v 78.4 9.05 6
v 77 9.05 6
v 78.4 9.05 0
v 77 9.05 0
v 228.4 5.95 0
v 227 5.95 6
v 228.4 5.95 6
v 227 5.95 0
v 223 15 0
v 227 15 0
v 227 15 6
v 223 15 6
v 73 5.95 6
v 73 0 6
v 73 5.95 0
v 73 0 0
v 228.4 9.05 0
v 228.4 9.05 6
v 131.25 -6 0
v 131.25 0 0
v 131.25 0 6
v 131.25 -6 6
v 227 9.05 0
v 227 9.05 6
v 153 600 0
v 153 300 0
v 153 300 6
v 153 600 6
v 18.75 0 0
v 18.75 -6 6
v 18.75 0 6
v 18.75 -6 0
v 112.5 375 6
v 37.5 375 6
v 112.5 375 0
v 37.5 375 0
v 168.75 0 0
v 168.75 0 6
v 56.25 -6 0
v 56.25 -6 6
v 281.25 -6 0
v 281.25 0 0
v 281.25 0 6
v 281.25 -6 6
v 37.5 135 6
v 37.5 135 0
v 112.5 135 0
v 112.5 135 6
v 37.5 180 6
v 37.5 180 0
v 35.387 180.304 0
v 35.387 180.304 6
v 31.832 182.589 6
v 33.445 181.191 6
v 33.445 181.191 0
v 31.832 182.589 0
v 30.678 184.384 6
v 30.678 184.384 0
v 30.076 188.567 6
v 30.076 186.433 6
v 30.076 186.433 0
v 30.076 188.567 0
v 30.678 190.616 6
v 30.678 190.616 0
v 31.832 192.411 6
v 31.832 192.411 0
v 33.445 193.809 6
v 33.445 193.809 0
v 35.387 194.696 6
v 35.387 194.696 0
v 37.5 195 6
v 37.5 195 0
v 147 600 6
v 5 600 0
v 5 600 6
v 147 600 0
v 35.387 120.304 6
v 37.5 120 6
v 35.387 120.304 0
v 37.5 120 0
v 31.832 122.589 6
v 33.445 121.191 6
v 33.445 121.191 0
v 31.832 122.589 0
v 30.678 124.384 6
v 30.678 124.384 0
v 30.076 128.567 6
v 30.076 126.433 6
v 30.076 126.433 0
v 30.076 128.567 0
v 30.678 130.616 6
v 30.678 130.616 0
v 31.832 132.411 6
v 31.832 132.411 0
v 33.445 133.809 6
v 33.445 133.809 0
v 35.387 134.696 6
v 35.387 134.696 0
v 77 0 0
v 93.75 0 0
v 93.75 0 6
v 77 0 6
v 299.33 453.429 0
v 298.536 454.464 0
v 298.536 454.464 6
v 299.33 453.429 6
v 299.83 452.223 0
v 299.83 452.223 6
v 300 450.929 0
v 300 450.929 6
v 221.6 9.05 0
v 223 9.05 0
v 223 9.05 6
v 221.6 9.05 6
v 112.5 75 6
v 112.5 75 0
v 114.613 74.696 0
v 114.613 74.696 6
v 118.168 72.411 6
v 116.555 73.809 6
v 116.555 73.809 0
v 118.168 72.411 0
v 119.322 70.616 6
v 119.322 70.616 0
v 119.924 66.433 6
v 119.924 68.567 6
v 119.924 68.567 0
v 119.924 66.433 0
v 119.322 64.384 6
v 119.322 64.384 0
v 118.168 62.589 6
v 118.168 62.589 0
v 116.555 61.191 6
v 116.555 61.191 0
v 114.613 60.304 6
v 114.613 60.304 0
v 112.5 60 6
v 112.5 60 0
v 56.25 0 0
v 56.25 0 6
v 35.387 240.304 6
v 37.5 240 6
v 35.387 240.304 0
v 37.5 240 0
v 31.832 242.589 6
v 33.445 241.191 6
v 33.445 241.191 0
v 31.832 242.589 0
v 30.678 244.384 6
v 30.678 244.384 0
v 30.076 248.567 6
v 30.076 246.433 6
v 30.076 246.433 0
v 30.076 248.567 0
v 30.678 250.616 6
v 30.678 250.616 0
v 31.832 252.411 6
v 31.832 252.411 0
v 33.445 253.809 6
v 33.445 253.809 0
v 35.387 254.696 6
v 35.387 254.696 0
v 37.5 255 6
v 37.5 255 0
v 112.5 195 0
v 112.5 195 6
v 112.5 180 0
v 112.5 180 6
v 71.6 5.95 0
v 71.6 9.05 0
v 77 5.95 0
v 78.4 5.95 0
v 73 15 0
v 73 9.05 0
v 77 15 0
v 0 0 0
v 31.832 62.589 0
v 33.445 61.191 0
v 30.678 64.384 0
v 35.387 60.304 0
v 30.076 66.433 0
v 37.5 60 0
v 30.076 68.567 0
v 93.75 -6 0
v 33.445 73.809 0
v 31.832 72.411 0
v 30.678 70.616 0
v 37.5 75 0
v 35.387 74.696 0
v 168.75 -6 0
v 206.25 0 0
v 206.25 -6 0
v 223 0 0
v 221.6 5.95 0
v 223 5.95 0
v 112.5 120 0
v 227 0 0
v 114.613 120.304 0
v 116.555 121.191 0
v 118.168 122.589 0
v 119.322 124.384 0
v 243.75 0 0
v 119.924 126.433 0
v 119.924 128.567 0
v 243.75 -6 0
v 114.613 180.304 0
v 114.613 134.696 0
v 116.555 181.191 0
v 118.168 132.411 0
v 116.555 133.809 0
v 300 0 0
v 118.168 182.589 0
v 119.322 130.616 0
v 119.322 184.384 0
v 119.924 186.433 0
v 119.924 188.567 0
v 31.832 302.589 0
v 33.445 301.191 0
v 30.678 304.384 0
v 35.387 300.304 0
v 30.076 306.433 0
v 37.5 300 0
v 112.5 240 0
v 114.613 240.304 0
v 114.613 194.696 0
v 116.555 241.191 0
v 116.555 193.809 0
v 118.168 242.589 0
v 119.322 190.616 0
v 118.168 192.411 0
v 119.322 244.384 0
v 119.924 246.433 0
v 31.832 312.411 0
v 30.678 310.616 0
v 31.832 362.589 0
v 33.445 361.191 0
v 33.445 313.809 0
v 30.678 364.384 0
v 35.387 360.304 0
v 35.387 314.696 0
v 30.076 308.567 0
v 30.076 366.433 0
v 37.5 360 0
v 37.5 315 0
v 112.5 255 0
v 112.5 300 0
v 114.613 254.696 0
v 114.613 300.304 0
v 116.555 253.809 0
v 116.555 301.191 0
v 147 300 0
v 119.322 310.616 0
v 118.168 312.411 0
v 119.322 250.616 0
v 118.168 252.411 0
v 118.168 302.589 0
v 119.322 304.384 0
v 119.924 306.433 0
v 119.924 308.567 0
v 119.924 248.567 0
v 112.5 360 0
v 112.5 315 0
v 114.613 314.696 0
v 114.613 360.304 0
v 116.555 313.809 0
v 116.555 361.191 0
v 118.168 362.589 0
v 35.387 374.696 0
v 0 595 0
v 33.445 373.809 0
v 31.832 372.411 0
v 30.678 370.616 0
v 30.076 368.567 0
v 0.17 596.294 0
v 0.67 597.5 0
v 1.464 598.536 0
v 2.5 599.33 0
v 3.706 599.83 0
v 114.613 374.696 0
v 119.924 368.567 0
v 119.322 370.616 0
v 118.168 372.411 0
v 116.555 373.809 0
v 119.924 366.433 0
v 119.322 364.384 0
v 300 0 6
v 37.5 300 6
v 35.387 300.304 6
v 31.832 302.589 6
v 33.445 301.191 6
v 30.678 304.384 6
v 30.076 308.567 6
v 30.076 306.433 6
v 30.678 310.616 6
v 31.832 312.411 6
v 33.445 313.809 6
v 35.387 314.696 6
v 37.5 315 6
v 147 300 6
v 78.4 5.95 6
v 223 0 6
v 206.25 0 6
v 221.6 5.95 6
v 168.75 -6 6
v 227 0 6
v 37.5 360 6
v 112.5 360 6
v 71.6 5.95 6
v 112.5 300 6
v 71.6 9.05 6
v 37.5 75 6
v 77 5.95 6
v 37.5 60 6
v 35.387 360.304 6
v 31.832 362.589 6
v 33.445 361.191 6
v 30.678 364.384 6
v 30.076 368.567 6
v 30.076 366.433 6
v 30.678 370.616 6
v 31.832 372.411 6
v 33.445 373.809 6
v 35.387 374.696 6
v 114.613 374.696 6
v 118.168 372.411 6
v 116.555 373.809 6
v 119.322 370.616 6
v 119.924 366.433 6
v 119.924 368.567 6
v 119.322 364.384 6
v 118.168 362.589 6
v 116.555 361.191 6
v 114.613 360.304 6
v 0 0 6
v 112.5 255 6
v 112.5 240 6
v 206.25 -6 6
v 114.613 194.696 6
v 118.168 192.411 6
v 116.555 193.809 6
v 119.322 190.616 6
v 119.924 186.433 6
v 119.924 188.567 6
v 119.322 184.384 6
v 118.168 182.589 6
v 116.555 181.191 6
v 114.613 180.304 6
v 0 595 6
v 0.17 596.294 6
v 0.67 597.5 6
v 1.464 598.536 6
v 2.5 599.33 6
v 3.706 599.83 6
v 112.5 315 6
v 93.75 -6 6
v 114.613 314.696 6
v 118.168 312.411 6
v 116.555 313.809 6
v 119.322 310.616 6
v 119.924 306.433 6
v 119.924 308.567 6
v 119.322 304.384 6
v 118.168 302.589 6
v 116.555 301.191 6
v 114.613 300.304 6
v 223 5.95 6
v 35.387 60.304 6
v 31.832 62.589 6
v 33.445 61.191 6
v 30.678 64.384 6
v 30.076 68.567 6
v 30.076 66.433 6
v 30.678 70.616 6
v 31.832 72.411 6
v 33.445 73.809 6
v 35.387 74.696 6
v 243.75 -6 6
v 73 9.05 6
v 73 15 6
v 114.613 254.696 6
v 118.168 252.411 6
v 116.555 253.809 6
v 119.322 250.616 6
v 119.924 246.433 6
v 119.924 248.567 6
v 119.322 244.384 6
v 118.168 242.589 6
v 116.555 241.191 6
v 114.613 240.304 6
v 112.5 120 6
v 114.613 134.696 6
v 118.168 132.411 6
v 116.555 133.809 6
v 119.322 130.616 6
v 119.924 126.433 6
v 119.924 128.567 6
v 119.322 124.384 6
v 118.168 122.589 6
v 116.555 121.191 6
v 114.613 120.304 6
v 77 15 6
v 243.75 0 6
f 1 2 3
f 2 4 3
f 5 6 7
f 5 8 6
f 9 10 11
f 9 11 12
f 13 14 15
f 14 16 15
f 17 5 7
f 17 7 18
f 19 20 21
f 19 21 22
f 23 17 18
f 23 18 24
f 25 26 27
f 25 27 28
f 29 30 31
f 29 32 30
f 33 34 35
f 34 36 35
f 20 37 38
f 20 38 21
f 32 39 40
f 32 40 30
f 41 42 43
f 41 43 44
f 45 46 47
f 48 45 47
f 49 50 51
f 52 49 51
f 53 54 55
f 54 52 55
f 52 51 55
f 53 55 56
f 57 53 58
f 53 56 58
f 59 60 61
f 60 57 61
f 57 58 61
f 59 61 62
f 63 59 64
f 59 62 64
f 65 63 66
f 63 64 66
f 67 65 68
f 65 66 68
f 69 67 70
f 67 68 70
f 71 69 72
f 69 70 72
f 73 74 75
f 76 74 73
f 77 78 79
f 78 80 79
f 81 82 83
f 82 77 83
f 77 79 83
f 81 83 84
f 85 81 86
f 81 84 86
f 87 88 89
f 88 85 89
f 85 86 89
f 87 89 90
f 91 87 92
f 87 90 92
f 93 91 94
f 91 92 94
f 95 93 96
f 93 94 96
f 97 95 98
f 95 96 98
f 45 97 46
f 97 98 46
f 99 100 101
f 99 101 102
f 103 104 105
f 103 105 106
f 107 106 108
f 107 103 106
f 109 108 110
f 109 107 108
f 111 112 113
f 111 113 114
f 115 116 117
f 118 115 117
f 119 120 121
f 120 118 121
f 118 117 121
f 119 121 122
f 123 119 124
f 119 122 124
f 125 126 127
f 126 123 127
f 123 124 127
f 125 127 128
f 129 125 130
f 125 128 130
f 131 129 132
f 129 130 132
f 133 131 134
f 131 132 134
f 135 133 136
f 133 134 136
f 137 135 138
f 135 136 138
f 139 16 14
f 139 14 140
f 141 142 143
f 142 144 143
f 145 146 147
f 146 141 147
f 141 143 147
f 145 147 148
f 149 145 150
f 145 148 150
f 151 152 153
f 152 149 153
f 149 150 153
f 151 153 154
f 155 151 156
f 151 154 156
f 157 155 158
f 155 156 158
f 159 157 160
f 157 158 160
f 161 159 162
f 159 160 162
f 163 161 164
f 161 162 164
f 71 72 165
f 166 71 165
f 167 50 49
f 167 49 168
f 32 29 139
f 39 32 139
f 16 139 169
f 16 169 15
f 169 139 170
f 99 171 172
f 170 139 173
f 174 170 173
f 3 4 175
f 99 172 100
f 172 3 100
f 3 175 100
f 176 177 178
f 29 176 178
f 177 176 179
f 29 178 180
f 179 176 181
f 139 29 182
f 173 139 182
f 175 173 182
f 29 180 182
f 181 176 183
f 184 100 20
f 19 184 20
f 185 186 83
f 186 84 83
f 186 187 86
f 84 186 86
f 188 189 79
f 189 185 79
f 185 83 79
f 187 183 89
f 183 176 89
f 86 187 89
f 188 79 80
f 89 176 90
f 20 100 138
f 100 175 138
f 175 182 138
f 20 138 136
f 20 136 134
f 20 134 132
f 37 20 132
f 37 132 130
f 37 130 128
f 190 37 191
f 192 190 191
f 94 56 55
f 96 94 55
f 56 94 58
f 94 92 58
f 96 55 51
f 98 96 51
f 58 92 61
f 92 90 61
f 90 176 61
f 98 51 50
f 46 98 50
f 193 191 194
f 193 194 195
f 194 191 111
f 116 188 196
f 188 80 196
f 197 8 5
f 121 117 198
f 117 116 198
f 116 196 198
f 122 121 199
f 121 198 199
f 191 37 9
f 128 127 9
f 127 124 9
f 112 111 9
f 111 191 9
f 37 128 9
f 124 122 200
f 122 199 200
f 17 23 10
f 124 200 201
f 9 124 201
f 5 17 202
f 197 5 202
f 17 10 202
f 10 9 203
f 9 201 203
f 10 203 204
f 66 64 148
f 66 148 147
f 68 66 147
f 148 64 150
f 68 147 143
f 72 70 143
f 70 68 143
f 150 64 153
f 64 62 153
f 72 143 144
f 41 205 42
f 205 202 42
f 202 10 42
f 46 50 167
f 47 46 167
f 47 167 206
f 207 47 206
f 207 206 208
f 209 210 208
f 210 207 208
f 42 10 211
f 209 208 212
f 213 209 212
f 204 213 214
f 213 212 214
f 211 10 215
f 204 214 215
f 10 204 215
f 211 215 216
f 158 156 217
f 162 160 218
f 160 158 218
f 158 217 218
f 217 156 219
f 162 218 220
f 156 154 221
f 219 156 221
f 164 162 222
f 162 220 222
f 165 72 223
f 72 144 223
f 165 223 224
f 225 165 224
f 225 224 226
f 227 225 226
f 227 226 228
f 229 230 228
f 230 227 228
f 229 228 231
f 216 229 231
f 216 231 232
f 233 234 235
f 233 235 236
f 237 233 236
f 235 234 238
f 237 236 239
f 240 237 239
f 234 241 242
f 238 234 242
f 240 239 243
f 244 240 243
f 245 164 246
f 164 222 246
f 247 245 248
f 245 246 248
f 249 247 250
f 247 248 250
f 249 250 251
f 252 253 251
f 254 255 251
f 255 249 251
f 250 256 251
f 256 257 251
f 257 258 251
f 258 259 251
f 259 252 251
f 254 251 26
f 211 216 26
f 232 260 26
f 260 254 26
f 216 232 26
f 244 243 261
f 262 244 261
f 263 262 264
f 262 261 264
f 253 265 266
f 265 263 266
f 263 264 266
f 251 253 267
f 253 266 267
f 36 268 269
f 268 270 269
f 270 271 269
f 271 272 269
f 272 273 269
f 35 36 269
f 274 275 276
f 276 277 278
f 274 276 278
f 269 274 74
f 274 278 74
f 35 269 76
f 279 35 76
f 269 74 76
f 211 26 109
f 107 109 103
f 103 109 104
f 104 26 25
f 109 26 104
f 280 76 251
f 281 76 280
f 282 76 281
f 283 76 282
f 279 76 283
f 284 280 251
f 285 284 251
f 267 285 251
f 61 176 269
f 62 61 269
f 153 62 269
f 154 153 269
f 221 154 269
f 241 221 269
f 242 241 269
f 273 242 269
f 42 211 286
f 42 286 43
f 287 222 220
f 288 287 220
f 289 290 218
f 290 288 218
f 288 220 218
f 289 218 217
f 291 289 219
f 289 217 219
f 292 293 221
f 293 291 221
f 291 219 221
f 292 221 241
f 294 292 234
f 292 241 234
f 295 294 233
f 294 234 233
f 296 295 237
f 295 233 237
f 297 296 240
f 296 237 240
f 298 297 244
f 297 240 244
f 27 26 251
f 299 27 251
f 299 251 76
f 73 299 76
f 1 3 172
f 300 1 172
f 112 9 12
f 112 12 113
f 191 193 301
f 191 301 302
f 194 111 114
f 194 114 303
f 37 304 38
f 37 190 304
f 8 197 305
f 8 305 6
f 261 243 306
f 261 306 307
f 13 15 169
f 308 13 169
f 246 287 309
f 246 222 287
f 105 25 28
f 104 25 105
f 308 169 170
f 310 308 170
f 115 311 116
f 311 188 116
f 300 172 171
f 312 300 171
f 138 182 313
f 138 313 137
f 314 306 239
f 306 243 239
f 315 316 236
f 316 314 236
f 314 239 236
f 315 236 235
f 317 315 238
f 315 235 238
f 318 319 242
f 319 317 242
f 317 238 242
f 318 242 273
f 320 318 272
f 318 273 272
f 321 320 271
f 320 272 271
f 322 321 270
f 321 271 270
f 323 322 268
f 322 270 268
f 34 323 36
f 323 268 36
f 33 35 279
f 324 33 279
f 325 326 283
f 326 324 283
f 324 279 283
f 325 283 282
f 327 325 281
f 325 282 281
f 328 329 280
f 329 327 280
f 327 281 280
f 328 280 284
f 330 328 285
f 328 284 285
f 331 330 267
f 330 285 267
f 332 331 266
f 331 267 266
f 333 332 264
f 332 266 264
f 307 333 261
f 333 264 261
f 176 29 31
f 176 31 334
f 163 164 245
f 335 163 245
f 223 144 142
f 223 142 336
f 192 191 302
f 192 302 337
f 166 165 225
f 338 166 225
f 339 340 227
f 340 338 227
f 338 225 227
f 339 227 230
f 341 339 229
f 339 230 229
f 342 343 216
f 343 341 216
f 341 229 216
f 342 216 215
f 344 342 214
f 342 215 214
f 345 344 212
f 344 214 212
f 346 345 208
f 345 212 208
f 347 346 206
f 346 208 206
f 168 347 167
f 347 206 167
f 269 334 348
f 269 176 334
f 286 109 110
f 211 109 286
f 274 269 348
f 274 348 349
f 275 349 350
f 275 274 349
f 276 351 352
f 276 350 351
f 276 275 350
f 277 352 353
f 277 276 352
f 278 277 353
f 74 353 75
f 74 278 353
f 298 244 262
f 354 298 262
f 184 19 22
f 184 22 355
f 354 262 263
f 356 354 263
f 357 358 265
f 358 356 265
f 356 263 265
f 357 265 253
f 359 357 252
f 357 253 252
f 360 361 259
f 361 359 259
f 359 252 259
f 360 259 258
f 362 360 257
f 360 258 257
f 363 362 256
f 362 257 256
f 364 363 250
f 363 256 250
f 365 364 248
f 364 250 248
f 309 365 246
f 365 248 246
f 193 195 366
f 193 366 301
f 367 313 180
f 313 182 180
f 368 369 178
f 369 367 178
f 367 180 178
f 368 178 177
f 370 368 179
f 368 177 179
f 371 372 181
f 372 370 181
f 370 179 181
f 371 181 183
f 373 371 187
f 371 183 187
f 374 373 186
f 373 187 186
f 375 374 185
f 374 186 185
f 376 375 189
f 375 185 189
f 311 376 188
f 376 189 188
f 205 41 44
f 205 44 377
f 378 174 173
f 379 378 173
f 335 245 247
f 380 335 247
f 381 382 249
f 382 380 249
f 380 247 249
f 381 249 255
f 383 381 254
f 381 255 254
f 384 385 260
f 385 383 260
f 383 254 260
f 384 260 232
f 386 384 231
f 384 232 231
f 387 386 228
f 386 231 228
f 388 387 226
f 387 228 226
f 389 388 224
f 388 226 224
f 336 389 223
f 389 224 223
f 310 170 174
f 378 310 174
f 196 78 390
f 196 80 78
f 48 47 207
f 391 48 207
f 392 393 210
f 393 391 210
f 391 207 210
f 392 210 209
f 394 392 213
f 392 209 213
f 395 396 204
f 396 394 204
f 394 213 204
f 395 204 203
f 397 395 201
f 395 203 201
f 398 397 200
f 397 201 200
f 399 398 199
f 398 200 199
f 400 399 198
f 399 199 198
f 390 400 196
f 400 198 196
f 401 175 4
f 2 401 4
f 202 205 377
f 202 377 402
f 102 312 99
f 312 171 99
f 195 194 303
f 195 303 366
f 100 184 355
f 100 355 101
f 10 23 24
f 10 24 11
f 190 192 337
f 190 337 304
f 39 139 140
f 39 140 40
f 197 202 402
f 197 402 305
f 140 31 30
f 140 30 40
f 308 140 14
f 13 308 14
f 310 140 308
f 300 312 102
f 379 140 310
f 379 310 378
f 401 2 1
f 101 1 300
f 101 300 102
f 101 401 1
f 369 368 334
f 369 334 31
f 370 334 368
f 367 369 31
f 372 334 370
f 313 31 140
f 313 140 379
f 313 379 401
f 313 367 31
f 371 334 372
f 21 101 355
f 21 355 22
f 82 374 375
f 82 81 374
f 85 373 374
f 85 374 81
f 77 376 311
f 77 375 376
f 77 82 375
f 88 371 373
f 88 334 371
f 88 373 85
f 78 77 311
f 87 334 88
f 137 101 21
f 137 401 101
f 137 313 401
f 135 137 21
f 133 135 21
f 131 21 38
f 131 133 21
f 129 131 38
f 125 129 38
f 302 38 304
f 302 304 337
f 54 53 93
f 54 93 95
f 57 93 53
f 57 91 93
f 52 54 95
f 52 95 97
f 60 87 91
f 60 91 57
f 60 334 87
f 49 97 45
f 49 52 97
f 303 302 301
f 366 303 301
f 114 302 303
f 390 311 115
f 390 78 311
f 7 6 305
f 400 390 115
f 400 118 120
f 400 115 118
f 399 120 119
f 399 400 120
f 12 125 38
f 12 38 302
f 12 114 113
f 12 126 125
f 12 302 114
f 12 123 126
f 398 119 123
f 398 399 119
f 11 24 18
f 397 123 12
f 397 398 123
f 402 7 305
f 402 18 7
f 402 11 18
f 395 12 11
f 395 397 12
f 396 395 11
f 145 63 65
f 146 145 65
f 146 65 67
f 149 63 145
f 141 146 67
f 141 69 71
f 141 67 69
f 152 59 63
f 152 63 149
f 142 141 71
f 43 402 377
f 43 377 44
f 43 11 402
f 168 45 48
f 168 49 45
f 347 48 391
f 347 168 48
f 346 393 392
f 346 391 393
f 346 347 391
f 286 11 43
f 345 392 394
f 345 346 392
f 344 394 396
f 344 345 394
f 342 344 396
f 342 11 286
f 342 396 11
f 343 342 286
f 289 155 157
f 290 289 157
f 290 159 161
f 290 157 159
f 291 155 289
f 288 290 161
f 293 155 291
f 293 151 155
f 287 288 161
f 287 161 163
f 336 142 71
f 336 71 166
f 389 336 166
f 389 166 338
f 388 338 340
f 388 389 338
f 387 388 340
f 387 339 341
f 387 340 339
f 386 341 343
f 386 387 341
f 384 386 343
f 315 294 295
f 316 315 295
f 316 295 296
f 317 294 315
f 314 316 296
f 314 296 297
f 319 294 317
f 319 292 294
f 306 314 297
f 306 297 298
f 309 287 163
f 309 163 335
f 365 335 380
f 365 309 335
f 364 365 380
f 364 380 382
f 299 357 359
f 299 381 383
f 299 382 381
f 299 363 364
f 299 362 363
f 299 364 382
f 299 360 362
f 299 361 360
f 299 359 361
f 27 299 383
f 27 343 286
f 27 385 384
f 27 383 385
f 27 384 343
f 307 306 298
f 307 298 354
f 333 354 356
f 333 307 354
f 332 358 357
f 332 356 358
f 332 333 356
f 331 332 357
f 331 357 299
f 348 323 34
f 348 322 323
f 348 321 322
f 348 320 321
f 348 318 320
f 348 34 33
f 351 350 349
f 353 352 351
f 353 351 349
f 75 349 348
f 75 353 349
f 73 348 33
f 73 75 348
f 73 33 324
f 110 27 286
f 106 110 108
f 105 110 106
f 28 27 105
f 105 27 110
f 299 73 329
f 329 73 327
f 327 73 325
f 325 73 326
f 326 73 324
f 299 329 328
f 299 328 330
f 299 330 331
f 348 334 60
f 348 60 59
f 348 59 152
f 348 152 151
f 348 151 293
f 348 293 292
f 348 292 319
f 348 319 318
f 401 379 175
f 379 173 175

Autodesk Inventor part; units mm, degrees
ref_plane "YZ Plane" through (0, 0, 0) normal (1, 0, 0) x (0, 1, 0)
ref_plane "XZ Plane" through (0, 0, 0) normal (0, 1, 0) x (-1, 0, 0)
ref_plane "XY Plane" through (0, 0, 0) normal (0, 0, 1) x (1, 0, 0)
sketch "Эскиз1" plane through (0, 0, 0) normal (0, 0, 1) x (1, 0, 0)
  line L0 (0, 0) -> (0, 595)
  line L1 (5, 600) -> (147, 600)
  line L2 (153, 600) -> (298.5355, 454.4645)
  line L3 (300, 450.9289) -> (300, 0)
  line L4 (300, 0) -> (281.25, 0)
  line L5 (281.25, 0) -> (281.25, -6)
  line L6 (281.25, -6) -> (243.75, -6)
  line L7 (243.75, -6) -> (243.75, 0)
  line L8 (243.75, 0) -> (206.25, 0)
  line L9 (206.25, 0) -> (206.25, -6)
  line L10 (206.25, -6) -> (168.75, -6)
  line L11 (168.75, -6) -> (168.75, 0)
  line L12 (168.75, 0) -> (131.25, 0)
  line L13 (131.25, 0) -> (131.25, -6)
  line L14 (131.25, -6) -> (93.75, -6)
  line L15 (93.75, -6) -> (93.75, 0)
  line L16 (93.75, 0) -> (56.25, 0)
  line L17 (56.25, 0) -> (56.25, -6)
  line L18 (56.25, -6) -> (18.75, -6)
  line L19 (18.75, -6) -> (18.75, 0)
  line L20 (18.75, 0) -> (0, 0)
  line L21 (18.75, 0) -> (-18.75, 0) construction
  line L22 (281.25, 0) -> (318.75, 0) construction
  line L23 (153, 600) -> (147, 600) construction
  line L24 (150, 600) -> (150, 0) construction
  line L25 (0, 300) -> (150, 300) construction
  line L26 (150, 300) -> (300, 300) construction
  arc A0 (37.5, 375) -> (37.5, 360) centre (37.5, 367.5) ccw
  line L27 (37.5, 360) -> (112.5, 360)
  line L28 (37.5, 375) -> (112.5, 375)
  line L29 (75, 375) -> (75, 360) construction
  arc A1 (112.5, 360) -> (112.5, 375) centre (112.5, 367.5) ccw
  line L30 (37.5, 367.5) -> (0, 367.5) construction
  line L31 (112.5, 367.5) -> (150, 367.5) construction
  line L32 (37.5, 300) -> (112.5, 300)
  arc A2 (112.5, 300) -> (112.5, 315) centre (112.5, 307.5) ccw
  line L33 (37.5, 315) -> (112.5, 315)
  arc A3 (37.5, 315) -> (37.5, 300) centre (37.5, 307.5) ccw
  line L34 (37.5, 240) -> (112.5, 240)
  arc A4 (112.5, 240) -> (112.5, 255) centre (112.5, 247.5) ccw
  line L35 (37.5, 255) -> (112.5, 255)
  arc A5 (37.5, 255) -> (37.5, 240) centre (37.5, 247.5) ccw
  line L36 (37.5, 180) -> (112.5, 180)
  arc A6 (112.5, 180) -> (112.5, 195) centre (112.5, 187.5) ccw
  line L37 (37.5, 195) -> (112.5, 195)
  arc A7 (37.5, 195) -> (37.5, 180) centre (37.5, 187.5) ccw
  line L38 (37.5, 120) -> (112.5, 120)
  arc A8 (112.5, 120) -> (112.5, 135) centre (112.5, 127.5) ccw
  line L39 (37.5, 135) -> (112.5, 135)
  arc A9 (37.5, 135) -> (37.5, 120) centre (37.5, 127.5) ccw
  line L40 (37.5, 60) -> (112.5, 60)
  arc A10 (112.5, 60) -> (112.5, 75) centre (112.5, 67.5) ccw
  line L41 (37.5, 75) -> (112.5, 75)
  arc A11 (37.5, 75) -> (37.5, 60) centre (37.5, 67.5) ccw
  line L42 (153, 300) -> (147, 300)
  line L43 (153, 300) -> (153, 600)
  line L44 (147, 300) -> (147, 600)
  arc A12 (300, 450.9289) -> (298.5355, 454.4645) centre (295, 450.9289) ccw
  arc A13 (5, 600) -> (0, 595) centre (5, 595) ccw
  point P0 (0, 600)
  point P1 (300, 453)
  point P2 (75, 300)
  point P3 (75, 315)
  point P4 (75, 240)
  point P5 (75, 255)
  point P6 (75, 180)
  point P7 (75, 195)
  point P8 (75, 120)
  point P9 (75, 135)
  point P10 (75, 60)
  point P11 (75, 75)
  dimension "d0" = 6
  dimension "d1" = 300
  dimension "d3" = 135
  dimension "d4" = 153
  dimension "d7" = 15
  dimension "d8" = 75
  dimension "d9" = 225
  dimension "d12" = 60
  dimension "d17" = 6
  dimension "d18" = 5
  dimension "d19" = 5
  dimension "d20" = 600
extrude "Корпус" add sketch "Эскиз1" along normal blind 6
sketch "Эскиз2" plane through (0, 0, 0) normal (0, 0, -1) x (-1, 0, 0)
  line L0 (-227, -6) -> (-227, 0) construction
  line L1 (-223, -6) -> (-223, 0) construction
  line L2 (-227, 0) -> (-227, 5.95)
  line L3 (-227, 5.95) -> (-228.4, 5.95)
  line L4 (-228.4, 5.95) -> (-228.4, 9.05)
  line L5 (-228.4, 9.05) -> (-227, 9.05)
  line L6 (-227, 9.05) -> (-227, 15)
  line L7 (-227, 15) -> (-223, 15)
  line L8 (-223, 15) -> (-223, 9.05)
  line L9 (-223, 9.05) -> (-221.6, 9.05)
  line L10 (-221.6, 9.05) -> (-221.6, 5.95)
  line L11 (-221.6, 5.95) -> (-223, 5.95)
  line L12 (-223, 5.95) -> (-223, 0)
  line L13 (-153, 55) -> (-153, 595) construction
  line L14 (-147, 55) -> (-147, 595) construction
  line L15 (-153, 595) -> (-147, 595) construction
  line L16 (-153, 55) -> (-147, 55) construction
  line L17 (-150, 595) -> (-150, 55) construction
  line L18 (-227, 0) -> (-223, 0)
  line L19 (-73, 0) -> (-73, 5.95)
  line L20 (-73, 5.95) -> (-71.6, 5.95)
  line L21 (-71.6, 5.95) -> (-71.6, 9.05)
  line L22 (-71.6, 9.05) -> (-73, 9.05)
  line L23 (-73, 9.05) -> (-73, 15)
  line L24 (-73, 15) -> (-77, 15)
  line L25 (-77, 15) -> (-77, 9.05)
  line L26 (-77, 9.05) -> (-78.4, 9.05)
  line L27 (-78.4, 9.05) -> (-78.4, 5.95)
  line L28 (-78.4, 5.95) -> (-77, 5.95)
  line L29 (-77, 5.95) -> (-77, 0)
  line L30 (-73, 0) -> (-77, 0)
  point P0 (0, 0)
  dimension "d21" = 15
  dimension "d22" = 3.1
  dimension "d23" = 6.8
extrude "Пазы" cut sketch "Эскиз2" against normal blind 6
equation "\"d4\" = 0.5 * d0 + 0.5 * d1"
equation "\"d8\" = 0.25 * d1"
equation "\"d9\" = 15 * d7"
equation "\"d12\" = 4 * d7"
equation "\"d17\" = d0"
equation "\"d5\" = d0"
equation "\"d24\" = d0"
properties part number "Korpus"
